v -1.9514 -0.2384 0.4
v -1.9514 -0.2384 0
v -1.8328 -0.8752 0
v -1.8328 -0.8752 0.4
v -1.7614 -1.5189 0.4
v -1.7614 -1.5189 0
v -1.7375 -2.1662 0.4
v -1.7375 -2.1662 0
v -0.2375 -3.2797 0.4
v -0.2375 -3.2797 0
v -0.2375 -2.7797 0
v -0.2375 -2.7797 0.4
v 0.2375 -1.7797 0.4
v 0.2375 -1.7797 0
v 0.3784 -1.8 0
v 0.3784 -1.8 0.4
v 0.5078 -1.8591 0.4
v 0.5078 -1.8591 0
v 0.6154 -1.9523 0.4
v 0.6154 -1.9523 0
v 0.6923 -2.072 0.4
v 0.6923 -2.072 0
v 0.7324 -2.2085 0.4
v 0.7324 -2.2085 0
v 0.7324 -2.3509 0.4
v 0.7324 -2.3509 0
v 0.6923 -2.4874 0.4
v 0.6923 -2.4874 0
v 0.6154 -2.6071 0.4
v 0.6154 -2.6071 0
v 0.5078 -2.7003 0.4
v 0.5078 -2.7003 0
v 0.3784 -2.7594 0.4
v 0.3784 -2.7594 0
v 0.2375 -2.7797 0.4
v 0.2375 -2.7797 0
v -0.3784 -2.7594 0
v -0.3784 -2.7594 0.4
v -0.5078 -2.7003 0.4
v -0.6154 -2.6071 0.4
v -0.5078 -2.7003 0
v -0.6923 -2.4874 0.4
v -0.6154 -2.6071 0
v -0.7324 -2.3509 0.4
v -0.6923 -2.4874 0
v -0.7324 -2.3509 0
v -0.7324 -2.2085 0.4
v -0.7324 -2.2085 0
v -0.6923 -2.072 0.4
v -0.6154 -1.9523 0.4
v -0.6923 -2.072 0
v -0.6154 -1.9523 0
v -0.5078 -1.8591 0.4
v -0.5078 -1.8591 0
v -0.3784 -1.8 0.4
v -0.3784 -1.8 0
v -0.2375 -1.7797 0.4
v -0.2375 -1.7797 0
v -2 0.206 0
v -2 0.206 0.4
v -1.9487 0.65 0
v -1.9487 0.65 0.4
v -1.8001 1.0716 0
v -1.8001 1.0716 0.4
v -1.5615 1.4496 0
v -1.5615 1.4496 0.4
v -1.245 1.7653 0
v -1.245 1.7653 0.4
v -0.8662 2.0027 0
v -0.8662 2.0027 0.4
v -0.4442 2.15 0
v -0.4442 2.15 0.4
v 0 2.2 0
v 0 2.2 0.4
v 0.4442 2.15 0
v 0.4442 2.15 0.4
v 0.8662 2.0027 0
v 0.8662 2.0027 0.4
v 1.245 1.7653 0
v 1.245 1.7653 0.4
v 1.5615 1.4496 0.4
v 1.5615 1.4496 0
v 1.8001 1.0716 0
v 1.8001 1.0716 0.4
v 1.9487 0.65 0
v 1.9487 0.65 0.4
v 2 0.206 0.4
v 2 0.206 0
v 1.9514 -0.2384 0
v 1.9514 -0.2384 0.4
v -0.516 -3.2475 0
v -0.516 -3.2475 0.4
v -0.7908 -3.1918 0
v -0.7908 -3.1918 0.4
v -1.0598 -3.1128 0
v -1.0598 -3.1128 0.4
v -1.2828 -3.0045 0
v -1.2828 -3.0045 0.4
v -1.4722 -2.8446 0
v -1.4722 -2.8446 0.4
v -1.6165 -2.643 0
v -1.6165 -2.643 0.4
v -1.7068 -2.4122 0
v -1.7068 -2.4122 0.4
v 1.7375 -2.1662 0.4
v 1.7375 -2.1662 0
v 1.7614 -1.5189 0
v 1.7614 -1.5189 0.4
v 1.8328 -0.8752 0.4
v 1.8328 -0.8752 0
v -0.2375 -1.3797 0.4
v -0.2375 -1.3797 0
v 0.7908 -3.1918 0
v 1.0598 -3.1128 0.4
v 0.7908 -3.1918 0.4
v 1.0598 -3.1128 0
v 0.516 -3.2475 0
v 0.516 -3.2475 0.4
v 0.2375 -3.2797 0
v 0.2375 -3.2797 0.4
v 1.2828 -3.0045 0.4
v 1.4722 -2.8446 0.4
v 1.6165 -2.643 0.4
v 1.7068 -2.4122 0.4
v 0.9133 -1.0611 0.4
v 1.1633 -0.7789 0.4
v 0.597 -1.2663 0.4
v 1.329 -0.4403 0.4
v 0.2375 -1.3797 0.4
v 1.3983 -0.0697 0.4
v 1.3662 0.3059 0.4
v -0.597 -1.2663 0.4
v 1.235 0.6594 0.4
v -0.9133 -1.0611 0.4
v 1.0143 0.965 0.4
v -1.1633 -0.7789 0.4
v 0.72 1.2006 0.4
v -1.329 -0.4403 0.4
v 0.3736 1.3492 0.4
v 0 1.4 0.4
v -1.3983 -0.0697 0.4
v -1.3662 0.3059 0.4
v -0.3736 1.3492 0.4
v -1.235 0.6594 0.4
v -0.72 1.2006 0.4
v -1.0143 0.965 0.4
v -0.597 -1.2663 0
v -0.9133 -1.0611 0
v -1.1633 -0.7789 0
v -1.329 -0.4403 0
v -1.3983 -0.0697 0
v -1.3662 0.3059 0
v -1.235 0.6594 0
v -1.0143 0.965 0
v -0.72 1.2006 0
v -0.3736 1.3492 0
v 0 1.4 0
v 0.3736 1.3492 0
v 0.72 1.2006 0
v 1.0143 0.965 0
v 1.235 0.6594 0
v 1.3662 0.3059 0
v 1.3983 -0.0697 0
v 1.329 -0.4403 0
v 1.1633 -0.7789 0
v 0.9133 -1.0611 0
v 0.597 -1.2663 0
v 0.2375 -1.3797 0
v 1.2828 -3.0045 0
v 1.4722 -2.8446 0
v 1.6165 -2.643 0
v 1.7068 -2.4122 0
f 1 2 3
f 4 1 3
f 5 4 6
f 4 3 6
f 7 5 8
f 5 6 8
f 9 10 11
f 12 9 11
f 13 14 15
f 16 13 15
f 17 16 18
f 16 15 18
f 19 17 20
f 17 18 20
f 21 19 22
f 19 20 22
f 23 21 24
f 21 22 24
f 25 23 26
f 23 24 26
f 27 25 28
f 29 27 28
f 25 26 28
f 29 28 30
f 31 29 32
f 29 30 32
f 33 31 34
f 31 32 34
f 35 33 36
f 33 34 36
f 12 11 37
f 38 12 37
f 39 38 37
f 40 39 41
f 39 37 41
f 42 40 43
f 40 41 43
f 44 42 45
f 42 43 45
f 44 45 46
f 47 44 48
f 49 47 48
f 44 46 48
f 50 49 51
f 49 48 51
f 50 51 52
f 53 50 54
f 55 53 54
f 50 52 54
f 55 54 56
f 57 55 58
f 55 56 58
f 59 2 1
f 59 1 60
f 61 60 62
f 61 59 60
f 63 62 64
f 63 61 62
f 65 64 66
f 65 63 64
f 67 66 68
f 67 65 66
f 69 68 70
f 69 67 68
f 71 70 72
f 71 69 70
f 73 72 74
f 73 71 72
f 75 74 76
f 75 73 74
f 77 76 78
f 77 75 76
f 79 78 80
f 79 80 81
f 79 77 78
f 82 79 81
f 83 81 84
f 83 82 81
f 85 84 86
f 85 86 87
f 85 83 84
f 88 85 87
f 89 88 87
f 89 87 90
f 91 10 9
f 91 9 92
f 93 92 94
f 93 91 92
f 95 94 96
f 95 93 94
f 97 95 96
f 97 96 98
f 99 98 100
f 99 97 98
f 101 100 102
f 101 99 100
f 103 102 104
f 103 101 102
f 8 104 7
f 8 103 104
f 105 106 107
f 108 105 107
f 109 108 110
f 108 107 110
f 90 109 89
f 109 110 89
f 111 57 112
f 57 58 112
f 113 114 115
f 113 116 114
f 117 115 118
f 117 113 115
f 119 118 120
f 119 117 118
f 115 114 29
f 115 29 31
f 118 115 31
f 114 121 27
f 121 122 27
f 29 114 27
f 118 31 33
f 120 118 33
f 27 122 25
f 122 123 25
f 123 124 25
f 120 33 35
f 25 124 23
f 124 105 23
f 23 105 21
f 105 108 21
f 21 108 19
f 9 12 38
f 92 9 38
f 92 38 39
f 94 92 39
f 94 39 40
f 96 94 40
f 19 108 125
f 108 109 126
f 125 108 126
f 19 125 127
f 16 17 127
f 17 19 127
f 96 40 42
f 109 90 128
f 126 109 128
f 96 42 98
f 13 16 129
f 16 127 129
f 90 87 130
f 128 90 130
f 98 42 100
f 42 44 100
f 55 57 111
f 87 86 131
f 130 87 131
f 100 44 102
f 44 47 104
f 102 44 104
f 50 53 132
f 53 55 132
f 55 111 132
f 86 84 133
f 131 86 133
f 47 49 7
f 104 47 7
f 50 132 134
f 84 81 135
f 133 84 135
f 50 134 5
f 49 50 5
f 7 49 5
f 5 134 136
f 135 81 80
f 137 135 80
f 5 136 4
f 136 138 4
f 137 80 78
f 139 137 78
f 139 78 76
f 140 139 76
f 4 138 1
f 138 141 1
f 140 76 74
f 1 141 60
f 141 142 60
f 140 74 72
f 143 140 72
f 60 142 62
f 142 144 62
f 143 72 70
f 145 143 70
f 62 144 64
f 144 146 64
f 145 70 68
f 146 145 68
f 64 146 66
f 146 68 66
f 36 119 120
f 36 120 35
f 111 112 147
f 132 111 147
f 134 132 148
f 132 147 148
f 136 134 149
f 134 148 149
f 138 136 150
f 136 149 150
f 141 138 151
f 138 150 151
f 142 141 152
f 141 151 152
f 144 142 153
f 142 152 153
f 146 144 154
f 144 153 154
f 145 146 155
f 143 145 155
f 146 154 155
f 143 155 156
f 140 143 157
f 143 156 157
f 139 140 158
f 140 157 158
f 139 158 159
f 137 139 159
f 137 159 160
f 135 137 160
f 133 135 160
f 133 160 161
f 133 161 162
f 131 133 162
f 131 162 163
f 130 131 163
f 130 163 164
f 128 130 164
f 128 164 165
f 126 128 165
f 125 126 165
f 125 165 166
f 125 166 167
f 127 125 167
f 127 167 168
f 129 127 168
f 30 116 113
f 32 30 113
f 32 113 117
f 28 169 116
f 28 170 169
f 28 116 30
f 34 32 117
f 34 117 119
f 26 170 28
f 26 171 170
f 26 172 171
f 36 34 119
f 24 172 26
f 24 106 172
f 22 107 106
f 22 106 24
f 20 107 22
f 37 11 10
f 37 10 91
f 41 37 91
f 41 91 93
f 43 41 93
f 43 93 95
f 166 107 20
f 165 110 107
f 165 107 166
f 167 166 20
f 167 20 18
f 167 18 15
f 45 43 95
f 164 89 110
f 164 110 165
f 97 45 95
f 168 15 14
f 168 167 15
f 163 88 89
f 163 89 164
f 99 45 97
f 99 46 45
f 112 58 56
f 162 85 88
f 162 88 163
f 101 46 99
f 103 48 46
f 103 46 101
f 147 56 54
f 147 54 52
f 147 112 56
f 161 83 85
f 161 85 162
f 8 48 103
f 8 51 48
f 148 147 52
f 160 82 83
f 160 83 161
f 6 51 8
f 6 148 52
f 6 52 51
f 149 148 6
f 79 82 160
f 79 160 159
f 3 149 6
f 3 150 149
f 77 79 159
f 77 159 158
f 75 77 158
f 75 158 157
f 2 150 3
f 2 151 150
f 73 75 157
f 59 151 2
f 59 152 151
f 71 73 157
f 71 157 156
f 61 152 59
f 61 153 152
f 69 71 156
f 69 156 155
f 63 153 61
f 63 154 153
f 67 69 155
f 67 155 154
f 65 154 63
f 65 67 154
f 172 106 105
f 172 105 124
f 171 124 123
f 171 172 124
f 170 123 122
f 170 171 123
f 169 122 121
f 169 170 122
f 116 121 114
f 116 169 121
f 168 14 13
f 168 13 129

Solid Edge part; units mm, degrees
sketch "Sketch1" plane through (0, 0, 0) normal (0, 0, 1) x (1, 0, 0)
  arc A0 (-1.0598, -3.1128) -> (-1.7375, -2.1662) centre (-0.7375, -2.1662) cw
  arc A1 (-1.9514, -0.2384) -> (-1.7375, -2.1662) centre (-10.5333, -2.1662) cw
  arc A2 (-1.9514, -0.2384) -> (1.9514, -0.2384) centre (0, 0.2) cw
  arc A3 (1.9514, -0.2384) -> (1.7375, -2.1662) centre (10.5333, -2.1662) ccw
  arc A4 (1.0598, -3.1128) -> (1.7375, -2.1662) centre (0.7375, -2.1662) ccw
  arc A5 (1.0598, -3.1128) -> (0.2375, -3.2797) centre (0, 0) cw
  line L0 (0.2375, -3.2797) -> (0.2375, -1.3797)
  arc A6 (-0.2375, -1.3797) -> (0.2375, -1.3797) centre (0, 0) cw
  line L1 (-0.2375, -3.2797) -> (-0.2375, -1.3797)
  arc A7 (-0.2375, -3.2797) -> (-1.0598, -3.1128) centre (0, 0) cw
  dimension "D1" = 1.4
  dimension "D2" = 2
  dimension "D3" = 0.8
  dimension "D4" = 0.2375
  dimension "D5" = 1.9
  dimension "D6" = 1.5
  dimension "D7" = 1
extrude "Protrusion1" add sketch "Sketch1" along normal blind 0.4
sketch "Sketch2" plane through (0, 0, 0) normal (0, 0, 1) x (1, 0, 0)
  circle A0 centre (-0.2375, -2.2797) radius 0.5
  dimension "D1" = 1
extrude "Cutout1" cut sketch "Sketch2" along normal through all
sketch "Sketch3" plane through (0, 0, 0) normal (0, 0, 1) x (1, 0, 0)
  circle A0 centre (0.2375, -2.2797) radius 0.5
  dimension "D1" = 1
extrude "Cutout2" cut sketch "Sketch3" along normal through all
properties material "Acier"
